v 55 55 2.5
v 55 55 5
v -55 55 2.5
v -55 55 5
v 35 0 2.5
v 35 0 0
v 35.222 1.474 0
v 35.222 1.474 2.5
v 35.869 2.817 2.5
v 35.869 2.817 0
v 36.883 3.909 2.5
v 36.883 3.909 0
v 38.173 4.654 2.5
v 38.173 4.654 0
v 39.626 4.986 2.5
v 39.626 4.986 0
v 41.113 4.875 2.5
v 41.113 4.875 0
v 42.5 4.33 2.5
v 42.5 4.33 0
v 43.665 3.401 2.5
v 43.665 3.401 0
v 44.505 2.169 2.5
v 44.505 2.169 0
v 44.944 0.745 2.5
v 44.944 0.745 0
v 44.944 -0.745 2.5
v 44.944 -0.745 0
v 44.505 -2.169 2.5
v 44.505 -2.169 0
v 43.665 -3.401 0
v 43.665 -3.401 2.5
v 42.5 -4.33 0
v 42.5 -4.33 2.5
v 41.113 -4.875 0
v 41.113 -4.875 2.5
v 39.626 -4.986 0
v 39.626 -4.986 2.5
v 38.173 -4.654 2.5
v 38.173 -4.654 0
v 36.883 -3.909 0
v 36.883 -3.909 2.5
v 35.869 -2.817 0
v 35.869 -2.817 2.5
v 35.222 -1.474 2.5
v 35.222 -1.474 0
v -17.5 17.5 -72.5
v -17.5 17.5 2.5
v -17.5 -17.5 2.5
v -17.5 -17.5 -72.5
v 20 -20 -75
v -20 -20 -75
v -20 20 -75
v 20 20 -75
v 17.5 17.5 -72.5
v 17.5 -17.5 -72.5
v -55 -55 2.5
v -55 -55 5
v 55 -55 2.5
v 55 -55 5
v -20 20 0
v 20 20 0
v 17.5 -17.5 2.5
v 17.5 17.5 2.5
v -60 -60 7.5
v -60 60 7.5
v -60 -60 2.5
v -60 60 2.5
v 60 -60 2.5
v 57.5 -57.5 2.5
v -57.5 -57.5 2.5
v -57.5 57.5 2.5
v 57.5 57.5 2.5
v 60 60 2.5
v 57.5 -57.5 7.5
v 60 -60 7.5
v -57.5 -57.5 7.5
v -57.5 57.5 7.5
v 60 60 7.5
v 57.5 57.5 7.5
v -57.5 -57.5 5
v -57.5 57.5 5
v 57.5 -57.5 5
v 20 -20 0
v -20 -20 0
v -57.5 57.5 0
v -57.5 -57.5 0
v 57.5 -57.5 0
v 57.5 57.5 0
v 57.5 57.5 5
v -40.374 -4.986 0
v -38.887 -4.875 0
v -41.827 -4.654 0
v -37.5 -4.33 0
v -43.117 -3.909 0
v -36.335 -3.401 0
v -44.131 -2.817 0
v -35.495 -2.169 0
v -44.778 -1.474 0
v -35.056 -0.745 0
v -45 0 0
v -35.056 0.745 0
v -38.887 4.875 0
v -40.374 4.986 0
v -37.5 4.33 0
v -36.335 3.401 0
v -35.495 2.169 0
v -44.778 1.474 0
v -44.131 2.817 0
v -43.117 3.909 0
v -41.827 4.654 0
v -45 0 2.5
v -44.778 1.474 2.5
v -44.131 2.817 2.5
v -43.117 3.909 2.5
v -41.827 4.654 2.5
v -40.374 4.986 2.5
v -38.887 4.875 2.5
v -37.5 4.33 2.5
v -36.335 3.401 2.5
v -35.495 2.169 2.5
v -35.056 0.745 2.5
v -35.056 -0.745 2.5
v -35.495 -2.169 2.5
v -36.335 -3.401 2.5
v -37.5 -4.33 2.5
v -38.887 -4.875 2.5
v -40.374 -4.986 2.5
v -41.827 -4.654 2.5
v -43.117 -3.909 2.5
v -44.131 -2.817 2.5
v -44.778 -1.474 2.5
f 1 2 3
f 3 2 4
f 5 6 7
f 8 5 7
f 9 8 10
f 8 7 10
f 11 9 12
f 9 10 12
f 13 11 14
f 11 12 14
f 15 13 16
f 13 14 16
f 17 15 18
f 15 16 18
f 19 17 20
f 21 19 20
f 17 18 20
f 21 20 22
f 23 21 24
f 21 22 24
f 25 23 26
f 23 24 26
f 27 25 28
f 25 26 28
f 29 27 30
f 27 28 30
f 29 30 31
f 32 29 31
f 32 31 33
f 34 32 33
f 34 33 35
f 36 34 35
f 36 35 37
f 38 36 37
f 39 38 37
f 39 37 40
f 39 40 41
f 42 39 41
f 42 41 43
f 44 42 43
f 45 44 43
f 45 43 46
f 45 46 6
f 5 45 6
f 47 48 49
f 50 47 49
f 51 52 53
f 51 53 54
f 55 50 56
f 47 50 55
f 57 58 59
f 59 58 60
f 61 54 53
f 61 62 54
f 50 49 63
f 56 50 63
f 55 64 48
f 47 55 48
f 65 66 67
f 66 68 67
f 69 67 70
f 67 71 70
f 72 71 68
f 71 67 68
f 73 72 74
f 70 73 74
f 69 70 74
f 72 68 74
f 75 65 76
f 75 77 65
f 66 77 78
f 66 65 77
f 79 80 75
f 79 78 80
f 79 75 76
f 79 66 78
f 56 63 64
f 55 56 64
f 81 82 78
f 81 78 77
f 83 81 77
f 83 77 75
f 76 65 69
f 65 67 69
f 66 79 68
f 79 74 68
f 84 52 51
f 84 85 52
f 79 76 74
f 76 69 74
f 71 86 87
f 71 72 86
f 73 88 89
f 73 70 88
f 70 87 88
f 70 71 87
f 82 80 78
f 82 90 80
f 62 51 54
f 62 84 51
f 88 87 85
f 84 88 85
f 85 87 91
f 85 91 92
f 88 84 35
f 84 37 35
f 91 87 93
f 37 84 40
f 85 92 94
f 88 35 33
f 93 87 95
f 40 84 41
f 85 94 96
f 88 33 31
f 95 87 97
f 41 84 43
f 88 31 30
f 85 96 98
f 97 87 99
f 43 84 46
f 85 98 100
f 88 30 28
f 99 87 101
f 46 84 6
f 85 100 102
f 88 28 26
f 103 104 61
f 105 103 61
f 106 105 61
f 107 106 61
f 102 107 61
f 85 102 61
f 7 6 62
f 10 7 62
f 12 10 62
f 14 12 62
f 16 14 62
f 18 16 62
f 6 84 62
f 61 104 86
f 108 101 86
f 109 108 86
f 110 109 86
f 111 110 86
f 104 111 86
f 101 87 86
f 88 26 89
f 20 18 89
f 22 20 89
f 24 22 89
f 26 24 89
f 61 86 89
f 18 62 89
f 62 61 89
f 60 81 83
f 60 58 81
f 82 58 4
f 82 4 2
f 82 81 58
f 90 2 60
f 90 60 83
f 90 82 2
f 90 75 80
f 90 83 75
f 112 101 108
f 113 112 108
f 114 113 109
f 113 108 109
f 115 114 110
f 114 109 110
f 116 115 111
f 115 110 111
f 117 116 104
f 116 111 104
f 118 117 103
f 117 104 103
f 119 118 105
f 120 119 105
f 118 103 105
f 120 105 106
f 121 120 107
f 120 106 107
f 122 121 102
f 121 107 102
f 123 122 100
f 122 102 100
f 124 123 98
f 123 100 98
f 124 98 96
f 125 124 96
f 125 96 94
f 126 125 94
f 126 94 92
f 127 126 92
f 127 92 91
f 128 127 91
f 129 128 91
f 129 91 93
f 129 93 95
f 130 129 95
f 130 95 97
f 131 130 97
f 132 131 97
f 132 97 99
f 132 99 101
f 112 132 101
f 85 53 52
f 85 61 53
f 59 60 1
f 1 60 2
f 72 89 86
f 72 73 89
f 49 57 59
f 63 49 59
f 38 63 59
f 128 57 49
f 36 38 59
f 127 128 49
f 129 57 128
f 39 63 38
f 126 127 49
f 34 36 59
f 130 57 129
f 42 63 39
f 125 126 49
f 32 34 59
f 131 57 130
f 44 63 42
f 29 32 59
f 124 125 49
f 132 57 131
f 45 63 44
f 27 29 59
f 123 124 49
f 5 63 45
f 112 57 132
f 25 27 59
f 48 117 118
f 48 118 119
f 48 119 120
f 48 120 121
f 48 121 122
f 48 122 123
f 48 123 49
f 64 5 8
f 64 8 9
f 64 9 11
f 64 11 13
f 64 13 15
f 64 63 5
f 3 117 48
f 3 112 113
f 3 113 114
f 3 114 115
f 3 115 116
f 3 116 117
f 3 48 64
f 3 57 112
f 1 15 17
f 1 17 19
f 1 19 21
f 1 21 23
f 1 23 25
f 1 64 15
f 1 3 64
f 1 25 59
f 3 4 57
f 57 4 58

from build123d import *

# Parameters (mm, degrees)
F1_W  = 40
F1_H  = 40
F7_W  = 40
F7_H  = 40
F4_W  = 115
F4_H  = 115
F5_W  = 115
F5_H  = 115
F6_W  = 120
F6_H  = 120
F10_W = 120
F10_H = 120
F14_W = 120
F14_H = 120
F12_W = 120
F12_H = 120
F16_T = -2.5
F18_D = 10
F20_D = 10


with BuildPart() as f8:
    # F1 (on offset) → F8 section 0
    with BuildSketch(Plane.XY.offset(-75)):
        Rectangle(F1_W, F1_H)
    # F7 (on Top) → F8 section 1
    with BuildSketch(Plane.XY):
        Rectangle(F7_W, F7_H)
    loft()

    # F4 (on Top) → F9 section 0
    with BuildSketch(Plane.XY):
        Rectangle(F4_W, F4_H)
    # F5 (on offset) → F9 section 1
    with BuildSketch(Plane.XY.offset(2.5)):
        Rectangle(F5_W, F5_H)
    loft()

    # F6 (on offset) → F11 section 0
    with BuildSketch(Plane.XY.offset(5)):
        Rectangle(F6_W, F6_H)
    # F10 (on offset) → F11 section 1
    with BuildSketch(Plane.XY.offset(2.5)):
        Rectangle(F10_W, F10_H)
    loft()

    # F14 (on offset) → F15 section 0
    with BuildSketch(Plane.XY.offset(7.5)):
        Rectangle(F14_W, F14_H)
    # F12 (on face) → F15 section 1
    with BuildSketch(Plane.XY.offset(5)):
        Rectangle(F12_W, F12_H)
    loft()

    # F16
    f16_openings = [f8.faces().sort_by_distance(p)[0] for p in [
        (0, 0, 7.5),
    ]]
    offset(amount=F16_T, openings=f16_openings, kind=Kind.INTERSECTION)

    # F18 (through all)
    with Locations(Plane.XY.offset(2.5)):
        with Locations((-40, 0)):
            Hole(F18_D / 2)

    # F20 (through all)
    with Locations(Plane.XY.offset(2.5)):
        with Locations((40, 0)):
            Hole(F20_D / 2)


solid = f8.part
